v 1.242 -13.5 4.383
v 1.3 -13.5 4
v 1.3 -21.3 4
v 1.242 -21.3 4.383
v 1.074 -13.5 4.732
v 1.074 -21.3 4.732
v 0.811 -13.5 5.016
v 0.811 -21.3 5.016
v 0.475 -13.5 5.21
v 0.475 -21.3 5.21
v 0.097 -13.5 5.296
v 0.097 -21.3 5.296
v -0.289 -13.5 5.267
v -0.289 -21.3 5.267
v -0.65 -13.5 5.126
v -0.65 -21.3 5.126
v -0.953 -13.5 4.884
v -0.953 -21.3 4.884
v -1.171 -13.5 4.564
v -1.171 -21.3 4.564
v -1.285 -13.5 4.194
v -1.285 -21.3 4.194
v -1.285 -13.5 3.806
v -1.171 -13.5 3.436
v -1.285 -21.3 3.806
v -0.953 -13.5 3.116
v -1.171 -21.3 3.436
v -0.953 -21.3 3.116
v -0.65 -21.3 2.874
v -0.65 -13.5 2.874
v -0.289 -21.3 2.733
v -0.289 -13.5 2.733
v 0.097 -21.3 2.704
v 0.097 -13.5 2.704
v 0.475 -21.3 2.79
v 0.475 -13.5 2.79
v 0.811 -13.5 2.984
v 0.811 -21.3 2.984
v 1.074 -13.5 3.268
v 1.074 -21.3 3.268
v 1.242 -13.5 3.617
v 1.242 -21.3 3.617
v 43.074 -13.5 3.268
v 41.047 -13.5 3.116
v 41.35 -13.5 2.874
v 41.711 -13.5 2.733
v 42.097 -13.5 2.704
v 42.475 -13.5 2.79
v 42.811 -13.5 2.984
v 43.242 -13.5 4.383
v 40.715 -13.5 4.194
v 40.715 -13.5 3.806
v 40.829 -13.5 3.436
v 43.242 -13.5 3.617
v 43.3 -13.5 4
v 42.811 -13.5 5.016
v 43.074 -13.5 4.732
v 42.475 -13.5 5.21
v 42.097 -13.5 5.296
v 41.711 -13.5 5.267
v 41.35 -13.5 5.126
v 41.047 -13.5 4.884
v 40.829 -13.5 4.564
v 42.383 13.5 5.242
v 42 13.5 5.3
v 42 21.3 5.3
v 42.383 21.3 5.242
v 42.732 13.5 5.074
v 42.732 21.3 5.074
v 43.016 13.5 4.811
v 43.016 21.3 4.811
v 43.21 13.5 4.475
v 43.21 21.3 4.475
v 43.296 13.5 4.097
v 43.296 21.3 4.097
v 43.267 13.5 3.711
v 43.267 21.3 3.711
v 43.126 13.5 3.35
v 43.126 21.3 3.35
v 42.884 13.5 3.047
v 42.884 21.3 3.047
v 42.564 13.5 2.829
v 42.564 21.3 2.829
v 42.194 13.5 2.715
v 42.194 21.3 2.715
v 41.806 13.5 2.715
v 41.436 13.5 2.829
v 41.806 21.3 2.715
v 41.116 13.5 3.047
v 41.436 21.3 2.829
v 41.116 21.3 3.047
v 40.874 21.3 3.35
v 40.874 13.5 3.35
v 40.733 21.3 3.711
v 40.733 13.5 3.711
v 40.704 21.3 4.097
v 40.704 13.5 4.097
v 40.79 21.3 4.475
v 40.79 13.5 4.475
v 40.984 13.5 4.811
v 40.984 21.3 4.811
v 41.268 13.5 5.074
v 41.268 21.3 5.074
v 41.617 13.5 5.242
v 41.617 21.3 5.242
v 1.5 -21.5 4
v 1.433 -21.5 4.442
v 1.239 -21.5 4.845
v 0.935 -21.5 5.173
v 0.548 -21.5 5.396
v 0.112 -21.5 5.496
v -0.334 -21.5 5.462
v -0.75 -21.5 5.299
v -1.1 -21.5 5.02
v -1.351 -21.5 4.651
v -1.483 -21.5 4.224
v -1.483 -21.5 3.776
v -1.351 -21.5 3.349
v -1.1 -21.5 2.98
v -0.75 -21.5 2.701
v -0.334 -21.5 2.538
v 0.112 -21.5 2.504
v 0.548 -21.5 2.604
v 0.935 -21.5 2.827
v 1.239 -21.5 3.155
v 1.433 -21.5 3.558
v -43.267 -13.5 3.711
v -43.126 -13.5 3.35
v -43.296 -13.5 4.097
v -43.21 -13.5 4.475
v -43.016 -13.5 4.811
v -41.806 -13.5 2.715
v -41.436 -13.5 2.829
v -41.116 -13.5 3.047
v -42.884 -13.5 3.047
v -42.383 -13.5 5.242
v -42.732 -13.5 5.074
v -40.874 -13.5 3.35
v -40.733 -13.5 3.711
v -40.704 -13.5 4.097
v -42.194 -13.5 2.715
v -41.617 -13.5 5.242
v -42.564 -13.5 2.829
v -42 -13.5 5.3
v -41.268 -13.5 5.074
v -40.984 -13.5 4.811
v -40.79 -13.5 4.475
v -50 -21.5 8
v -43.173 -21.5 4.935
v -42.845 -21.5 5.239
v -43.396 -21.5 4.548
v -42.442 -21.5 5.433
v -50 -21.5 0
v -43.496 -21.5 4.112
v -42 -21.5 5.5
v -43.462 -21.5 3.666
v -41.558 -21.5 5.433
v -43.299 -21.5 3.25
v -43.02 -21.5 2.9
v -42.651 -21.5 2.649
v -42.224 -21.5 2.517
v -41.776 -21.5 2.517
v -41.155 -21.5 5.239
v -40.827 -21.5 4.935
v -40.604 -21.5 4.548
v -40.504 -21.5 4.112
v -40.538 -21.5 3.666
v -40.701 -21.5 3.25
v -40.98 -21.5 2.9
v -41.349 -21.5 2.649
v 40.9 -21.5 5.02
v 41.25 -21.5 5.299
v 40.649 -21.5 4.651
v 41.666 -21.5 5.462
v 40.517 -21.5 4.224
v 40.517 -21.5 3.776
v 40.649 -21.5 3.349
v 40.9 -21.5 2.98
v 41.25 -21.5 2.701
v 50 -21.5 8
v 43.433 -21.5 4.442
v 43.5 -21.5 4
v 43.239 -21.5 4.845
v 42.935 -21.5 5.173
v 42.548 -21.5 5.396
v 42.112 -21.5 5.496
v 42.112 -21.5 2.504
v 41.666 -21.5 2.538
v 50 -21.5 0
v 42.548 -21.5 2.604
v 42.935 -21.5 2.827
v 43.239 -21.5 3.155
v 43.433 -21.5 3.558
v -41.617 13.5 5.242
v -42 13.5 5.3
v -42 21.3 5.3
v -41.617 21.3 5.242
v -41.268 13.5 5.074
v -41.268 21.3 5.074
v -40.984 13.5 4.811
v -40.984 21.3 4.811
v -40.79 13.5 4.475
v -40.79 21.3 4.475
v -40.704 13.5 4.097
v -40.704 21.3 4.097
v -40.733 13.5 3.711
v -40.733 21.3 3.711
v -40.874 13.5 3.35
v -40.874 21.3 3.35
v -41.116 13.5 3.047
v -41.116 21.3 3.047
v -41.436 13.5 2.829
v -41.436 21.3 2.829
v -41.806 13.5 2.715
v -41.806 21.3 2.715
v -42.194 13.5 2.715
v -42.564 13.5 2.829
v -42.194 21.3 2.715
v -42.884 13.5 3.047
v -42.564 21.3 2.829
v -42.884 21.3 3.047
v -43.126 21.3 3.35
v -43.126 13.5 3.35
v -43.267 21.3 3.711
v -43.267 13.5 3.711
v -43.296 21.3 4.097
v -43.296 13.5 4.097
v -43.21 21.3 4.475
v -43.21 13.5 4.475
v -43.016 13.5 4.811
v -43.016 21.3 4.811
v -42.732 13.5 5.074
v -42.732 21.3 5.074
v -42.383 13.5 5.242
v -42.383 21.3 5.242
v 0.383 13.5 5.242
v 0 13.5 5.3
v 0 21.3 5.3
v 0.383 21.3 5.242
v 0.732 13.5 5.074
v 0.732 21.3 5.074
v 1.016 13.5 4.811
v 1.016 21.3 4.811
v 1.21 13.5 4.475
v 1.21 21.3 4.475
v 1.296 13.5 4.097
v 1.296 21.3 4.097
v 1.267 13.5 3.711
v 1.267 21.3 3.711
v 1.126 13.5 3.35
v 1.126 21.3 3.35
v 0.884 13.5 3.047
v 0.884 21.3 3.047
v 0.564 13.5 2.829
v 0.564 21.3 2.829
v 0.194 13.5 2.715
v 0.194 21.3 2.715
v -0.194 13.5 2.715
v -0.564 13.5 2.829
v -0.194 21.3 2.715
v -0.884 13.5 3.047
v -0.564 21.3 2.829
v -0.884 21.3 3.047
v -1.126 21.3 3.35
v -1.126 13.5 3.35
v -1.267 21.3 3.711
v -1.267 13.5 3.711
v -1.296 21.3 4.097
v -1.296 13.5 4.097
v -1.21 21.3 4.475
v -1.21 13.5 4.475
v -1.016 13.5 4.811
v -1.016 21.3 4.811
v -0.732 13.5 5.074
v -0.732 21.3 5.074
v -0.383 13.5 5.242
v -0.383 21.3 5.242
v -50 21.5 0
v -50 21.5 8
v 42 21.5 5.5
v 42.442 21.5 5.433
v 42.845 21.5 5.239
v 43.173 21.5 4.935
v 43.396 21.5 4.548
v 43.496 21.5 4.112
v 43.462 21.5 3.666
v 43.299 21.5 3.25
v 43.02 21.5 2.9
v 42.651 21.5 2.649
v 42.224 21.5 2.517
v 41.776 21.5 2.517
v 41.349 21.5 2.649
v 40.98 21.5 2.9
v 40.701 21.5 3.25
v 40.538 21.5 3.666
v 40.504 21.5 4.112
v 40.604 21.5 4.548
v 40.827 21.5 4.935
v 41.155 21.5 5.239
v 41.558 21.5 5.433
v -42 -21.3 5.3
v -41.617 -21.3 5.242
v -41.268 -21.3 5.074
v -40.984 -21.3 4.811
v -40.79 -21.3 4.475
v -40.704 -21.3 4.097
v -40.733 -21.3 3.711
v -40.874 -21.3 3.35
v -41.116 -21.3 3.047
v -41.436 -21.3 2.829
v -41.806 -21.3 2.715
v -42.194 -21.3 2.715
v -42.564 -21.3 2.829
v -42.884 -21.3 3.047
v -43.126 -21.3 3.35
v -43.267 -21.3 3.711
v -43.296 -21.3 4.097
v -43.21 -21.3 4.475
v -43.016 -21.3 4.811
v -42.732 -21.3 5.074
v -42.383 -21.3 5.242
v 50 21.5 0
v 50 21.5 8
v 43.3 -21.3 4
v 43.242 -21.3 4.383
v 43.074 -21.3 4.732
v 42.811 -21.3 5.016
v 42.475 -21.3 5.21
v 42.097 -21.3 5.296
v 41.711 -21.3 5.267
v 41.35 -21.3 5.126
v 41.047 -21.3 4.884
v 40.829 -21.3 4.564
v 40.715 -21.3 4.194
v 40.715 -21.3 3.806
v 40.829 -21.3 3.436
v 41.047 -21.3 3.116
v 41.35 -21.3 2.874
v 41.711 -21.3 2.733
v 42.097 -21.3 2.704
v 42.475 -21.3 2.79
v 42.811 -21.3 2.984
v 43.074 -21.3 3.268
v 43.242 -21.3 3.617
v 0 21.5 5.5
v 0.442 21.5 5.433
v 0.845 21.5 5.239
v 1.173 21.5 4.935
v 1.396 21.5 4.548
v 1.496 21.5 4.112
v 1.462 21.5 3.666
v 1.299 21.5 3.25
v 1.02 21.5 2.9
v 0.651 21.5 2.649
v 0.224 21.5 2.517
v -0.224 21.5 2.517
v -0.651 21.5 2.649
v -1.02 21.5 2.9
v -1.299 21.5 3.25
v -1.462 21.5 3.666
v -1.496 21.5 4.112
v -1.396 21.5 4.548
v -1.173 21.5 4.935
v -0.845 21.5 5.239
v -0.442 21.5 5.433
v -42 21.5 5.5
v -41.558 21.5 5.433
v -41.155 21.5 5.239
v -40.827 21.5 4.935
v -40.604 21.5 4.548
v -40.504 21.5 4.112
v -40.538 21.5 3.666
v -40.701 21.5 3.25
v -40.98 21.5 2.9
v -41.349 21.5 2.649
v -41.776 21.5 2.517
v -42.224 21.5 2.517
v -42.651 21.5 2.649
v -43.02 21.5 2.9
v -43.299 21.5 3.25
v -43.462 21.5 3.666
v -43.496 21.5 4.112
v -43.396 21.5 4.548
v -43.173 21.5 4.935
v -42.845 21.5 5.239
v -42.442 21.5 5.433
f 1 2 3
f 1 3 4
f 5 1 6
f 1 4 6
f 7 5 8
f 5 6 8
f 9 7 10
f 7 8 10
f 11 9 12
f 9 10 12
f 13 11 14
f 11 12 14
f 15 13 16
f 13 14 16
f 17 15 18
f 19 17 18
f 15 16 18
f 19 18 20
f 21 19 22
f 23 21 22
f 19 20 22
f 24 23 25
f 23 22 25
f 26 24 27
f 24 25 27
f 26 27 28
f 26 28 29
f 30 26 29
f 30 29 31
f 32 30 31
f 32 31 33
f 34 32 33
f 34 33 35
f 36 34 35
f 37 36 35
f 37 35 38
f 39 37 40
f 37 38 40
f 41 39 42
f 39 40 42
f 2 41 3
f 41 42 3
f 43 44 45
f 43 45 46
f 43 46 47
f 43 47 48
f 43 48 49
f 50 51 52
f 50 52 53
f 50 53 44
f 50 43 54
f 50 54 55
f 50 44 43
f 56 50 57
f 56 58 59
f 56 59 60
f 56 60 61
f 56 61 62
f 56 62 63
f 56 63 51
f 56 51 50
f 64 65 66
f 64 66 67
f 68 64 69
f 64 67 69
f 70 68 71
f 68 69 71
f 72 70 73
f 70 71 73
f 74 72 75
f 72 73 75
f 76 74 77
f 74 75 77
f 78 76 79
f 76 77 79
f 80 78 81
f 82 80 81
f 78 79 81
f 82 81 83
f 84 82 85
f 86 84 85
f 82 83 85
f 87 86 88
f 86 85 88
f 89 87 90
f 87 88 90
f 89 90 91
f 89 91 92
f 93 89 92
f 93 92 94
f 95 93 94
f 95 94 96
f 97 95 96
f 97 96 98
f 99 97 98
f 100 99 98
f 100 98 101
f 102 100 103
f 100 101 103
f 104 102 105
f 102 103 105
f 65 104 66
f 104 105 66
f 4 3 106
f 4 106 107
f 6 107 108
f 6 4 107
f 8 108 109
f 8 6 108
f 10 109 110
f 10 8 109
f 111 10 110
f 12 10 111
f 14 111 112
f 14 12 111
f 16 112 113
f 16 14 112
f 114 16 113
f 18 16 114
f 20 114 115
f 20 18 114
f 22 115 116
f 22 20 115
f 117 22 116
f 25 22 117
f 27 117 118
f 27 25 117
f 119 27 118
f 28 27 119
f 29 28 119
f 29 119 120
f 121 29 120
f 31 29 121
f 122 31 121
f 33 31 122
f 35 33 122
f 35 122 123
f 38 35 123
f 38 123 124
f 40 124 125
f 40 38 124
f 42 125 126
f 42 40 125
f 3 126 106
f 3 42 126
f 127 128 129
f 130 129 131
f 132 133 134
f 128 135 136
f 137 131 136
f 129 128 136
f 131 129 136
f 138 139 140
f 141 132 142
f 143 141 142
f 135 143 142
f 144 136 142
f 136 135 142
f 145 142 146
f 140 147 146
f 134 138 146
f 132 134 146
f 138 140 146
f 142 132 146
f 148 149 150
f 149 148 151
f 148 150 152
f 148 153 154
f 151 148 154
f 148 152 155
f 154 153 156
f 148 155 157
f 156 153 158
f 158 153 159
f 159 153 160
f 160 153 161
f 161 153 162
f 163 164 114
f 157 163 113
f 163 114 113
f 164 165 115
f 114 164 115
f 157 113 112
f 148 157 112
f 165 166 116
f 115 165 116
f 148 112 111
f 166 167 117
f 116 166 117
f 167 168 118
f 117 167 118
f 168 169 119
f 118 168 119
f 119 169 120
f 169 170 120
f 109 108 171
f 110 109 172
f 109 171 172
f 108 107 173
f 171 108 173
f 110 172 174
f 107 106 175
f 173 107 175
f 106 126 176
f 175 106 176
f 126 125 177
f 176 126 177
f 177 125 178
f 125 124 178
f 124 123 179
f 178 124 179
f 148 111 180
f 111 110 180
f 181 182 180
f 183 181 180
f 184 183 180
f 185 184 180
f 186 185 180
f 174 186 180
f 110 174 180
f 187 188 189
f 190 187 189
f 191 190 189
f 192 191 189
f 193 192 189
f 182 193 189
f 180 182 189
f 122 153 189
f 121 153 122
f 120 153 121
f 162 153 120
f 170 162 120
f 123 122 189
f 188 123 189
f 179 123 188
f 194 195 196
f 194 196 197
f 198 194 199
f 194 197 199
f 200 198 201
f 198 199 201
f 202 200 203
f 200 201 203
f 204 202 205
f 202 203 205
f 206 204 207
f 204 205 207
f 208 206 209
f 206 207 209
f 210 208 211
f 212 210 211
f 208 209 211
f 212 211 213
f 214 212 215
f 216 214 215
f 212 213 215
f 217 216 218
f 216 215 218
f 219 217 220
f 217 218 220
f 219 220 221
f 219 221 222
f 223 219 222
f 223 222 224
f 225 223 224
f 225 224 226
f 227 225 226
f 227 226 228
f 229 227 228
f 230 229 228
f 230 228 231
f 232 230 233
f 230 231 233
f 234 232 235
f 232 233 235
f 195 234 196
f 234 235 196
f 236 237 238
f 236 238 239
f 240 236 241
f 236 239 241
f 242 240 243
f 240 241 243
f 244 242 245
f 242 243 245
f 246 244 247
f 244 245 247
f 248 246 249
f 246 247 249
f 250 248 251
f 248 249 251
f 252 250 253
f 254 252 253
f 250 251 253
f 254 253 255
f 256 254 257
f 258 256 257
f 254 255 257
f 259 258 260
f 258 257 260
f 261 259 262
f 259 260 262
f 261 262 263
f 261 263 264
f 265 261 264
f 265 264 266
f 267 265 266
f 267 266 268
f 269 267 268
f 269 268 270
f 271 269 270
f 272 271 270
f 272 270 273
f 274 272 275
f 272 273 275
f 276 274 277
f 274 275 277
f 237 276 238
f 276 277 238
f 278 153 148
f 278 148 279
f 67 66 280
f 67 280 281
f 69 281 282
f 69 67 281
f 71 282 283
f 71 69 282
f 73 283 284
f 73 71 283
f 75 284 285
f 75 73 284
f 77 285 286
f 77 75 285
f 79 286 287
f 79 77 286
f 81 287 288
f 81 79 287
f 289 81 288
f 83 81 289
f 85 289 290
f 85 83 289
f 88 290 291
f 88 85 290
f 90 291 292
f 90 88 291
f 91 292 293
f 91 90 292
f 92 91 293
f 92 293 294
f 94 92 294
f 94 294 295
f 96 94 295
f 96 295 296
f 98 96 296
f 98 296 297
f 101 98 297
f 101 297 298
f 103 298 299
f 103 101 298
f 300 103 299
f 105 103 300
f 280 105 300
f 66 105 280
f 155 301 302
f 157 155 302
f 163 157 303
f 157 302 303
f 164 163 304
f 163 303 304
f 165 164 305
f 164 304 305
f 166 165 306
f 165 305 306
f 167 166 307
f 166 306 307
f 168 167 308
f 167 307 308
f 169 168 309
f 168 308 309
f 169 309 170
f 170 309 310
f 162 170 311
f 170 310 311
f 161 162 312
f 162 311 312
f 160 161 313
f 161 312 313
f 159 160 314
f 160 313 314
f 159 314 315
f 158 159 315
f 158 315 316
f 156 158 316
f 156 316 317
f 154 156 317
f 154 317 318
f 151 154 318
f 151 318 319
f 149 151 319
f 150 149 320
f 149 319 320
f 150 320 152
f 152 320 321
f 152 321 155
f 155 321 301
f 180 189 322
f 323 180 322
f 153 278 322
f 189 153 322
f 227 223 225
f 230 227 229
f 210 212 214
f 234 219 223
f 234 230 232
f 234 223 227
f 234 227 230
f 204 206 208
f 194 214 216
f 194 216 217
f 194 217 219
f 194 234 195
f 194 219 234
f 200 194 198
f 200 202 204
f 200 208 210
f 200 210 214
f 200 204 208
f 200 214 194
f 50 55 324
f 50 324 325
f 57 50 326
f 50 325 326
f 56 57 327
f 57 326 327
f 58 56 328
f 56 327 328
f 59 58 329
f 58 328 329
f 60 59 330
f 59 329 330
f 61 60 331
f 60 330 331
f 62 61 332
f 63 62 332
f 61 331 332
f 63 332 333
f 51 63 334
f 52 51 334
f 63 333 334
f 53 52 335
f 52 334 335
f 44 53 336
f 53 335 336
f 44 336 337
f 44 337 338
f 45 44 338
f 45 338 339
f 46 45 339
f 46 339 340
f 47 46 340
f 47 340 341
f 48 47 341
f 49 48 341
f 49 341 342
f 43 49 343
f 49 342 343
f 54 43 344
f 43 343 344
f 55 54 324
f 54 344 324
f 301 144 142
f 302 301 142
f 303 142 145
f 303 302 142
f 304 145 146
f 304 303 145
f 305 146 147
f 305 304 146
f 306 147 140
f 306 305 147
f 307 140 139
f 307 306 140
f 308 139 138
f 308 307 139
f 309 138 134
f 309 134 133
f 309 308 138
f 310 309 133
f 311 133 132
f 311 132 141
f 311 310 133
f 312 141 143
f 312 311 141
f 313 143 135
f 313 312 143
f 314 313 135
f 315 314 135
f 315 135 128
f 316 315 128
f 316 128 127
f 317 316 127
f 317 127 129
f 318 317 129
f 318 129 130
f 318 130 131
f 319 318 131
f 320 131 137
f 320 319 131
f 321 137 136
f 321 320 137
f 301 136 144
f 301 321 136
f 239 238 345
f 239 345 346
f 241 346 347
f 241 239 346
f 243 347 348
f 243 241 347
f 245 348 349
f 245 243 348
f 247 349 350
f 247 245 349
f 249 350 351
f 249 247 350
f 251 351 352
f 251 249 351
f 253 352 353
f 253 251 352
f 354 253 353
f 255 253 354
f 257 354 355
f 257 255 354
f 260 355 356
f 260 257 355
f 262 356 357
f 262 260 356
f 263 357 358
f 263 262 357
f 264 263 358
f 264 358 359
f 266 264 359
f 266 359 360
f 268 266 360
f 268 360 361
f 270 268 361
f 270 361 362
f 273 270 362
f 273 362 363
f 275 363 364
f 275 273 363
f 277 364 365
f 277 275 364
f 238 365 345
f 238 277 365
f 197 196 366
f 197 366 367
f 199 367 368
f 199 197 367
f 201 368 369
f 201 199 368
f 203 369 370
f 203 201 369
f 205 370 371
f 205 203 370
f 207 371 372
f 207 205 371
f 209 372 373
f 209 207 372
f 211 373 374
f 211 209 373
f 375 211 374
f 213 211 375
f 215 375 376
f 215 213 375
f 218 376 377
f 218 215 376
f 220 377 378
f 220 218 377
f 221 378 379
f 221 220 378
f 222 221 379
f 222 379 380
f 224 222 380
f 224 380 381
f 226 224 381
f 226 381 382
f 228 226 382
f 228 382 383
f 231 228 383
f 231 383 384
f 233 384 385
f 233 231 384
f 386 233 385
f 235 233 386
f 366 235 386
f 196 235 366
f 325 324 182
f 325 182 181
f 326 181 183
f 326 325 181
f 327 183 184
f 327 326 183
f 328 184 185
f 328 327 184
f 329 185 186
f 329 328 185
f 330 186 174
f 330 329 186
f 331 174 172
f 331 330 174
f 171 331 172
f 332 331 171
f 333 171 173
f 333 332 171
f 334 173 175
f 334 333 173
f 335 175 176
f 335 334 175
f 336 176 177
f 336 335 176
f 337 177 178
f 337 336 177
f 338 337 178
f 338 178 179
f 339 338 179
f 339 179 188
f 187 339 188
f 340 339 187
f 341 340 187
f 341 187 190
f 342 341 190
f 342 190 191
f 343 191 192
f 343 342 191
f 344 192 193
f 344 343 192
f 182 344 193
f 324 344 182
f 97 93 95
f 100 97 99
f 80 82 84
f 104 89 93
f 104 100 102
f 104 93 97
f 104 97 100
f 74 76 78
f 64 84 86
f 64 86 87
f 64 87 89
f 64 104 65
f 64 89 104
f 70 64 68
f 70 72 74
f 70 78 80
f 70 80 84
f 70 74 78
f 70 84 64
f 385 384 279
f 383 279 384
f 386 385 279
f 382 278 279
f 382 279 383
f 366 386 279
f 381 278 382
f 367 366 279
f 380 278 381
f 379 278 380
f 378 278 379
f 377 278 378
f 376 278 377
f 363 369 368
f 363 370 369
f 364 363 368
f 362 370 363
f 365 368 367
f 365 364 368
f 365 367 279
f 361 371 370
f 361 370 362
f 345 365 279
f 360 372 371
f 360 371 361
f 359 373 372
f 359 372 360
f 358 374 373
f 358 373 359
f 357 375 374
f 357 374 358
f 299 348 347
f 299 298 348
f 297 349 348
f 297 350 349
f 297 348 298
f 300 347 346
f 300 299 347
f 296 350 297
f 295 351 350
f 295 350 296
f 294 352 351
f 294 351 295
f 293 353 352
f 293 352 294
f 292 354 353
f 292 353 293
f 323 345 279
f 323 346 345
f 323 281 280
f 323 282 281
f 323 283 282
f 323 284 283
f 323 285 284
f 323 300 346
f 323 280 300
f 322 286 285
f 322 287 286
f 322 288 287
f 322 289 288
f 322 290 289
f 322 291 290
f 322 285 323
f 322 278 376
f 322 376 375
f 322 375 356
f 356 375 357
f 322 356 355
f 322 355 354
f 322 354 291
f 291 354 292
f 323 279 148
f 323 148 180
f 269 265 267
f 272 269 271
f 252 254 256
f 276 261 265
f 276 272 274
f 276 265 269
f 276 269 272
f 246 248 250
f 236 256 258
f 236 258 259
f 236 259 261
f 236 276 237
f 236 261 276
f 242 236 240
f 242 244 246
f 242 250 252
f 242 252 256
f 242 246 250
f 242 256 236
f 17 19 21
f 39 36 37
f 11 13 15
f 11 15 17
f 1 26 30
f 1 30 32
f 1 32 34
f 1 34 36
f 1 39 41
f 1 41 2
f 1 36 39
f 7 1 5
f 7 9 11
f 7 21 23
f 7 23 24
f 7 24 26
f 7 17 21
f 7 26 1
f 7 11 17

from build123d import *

# Parameters (mm, degrees)
SKETCH_1_W               = 100
SKETCH_1_H               = 43
EXTRUDE_1_DEPTH          = 8
SKETCH_2_R               = 1.3
CUT_EXTRUDE_1_DEPTH      = 8
PATTERN_LINEAR_1_COUNT   = 3
PATTERN_LINEAR_1_PITCH   = 42
MIRROR_1_COPY_1_SKETCH_R = 1.3
MIRROR_1_COPY_1_DEPTH    = 8
MIRROR_1_COPY_2_SKETCH_R = 1.3
MIRROR_1_COPY_2_DEPTH    = 8
CHAMFER_1_SIZE           = 0.2


with BuildPart() as part:
    # 草圖1 → 填料-伸長1 (new body)
    with BuildSketch(Plane.XY):
        Rectangle(SKETCH_1_W, SKETCH_1_H)
    extrude(amount=EXTRUDE_1_DEPTH)

    # 草圖2 → 除料-伸長1 (cut)
    with BuildSketch(Plane(origin=(0, 21.5, 0), x_dir=(1, 0, 0), z_dir=(0, 1, 0))):
        with Locations(Location((-42, -4, 0), (0, 0, 270))):
            Circle(SKETCH_2_R)
    cut_extrude_1 = extrude(amount=-CUT_EXTRUDE_1_DEPTH, mode=Mode.SUBTRACT)

    # 直線複製排列1: 除料-伸長1 ×3
    with Locations(*[(i * PATTERN_LINEAR_1_PITCH, 0, 0) for i in range(1, PATTERN_LINEAR_1_COUNT)]):
        add(cut_extrude_1, mode=Mode.SUBTRACT)

    # 鏡射1: 除料-伸長1 across plane
    add(cut_extrude_1.mirror(Plane.ZX), mode=Mode.SUBTRACT)

    # 鏡射1 copy 1 sketch → 鏡射1 copy 1 (cut)
    with BuildSketch(Plane(origin=(42, -21.5, 0), x_dir=(1, 0, 0), z_dir=(0, -1, 0))):
        with Locations((-42, 4)):
            Circle(MIRROR_1_COPY_1_SKETCH_R)
    extrude(amount=-MIRROR_1_COPY_1_DEPTH, mode=Mode.SUBTRACT)

    # 鏡射1 copy 2 sketch → 鏡射1 copy 2 (cut)
    with BuildSketch(Plane(origin=(84, -21.5, 0), x_dir=(1, 0, 0), z_dir=(0, -1, 0))):
        with Locations((-42, 4)):
            Circle(MIRROR_1_COPY_2_SKETCH_R)
    extrude(amount=-MIRROR_1_COPY_2_DEPTH, mode=Mode.SUBTRACT)

    # 導角1
    chamfer_1_edges = [part.edges().sort_by_distance(p)[0] for p in [
        (-42, 21.5, 2.7),
        (0, 21.5, 2.7),
        (42, 21.5, 2.7),
        (-42, -21.5, 2.7),
        (-1.3, -21.5, 4),
        (40.7, -21.5, 4),
    ]]
    chamfer(chamfer_1_edges, length=CHAMFER_1_SIZE)


solid = part.part
